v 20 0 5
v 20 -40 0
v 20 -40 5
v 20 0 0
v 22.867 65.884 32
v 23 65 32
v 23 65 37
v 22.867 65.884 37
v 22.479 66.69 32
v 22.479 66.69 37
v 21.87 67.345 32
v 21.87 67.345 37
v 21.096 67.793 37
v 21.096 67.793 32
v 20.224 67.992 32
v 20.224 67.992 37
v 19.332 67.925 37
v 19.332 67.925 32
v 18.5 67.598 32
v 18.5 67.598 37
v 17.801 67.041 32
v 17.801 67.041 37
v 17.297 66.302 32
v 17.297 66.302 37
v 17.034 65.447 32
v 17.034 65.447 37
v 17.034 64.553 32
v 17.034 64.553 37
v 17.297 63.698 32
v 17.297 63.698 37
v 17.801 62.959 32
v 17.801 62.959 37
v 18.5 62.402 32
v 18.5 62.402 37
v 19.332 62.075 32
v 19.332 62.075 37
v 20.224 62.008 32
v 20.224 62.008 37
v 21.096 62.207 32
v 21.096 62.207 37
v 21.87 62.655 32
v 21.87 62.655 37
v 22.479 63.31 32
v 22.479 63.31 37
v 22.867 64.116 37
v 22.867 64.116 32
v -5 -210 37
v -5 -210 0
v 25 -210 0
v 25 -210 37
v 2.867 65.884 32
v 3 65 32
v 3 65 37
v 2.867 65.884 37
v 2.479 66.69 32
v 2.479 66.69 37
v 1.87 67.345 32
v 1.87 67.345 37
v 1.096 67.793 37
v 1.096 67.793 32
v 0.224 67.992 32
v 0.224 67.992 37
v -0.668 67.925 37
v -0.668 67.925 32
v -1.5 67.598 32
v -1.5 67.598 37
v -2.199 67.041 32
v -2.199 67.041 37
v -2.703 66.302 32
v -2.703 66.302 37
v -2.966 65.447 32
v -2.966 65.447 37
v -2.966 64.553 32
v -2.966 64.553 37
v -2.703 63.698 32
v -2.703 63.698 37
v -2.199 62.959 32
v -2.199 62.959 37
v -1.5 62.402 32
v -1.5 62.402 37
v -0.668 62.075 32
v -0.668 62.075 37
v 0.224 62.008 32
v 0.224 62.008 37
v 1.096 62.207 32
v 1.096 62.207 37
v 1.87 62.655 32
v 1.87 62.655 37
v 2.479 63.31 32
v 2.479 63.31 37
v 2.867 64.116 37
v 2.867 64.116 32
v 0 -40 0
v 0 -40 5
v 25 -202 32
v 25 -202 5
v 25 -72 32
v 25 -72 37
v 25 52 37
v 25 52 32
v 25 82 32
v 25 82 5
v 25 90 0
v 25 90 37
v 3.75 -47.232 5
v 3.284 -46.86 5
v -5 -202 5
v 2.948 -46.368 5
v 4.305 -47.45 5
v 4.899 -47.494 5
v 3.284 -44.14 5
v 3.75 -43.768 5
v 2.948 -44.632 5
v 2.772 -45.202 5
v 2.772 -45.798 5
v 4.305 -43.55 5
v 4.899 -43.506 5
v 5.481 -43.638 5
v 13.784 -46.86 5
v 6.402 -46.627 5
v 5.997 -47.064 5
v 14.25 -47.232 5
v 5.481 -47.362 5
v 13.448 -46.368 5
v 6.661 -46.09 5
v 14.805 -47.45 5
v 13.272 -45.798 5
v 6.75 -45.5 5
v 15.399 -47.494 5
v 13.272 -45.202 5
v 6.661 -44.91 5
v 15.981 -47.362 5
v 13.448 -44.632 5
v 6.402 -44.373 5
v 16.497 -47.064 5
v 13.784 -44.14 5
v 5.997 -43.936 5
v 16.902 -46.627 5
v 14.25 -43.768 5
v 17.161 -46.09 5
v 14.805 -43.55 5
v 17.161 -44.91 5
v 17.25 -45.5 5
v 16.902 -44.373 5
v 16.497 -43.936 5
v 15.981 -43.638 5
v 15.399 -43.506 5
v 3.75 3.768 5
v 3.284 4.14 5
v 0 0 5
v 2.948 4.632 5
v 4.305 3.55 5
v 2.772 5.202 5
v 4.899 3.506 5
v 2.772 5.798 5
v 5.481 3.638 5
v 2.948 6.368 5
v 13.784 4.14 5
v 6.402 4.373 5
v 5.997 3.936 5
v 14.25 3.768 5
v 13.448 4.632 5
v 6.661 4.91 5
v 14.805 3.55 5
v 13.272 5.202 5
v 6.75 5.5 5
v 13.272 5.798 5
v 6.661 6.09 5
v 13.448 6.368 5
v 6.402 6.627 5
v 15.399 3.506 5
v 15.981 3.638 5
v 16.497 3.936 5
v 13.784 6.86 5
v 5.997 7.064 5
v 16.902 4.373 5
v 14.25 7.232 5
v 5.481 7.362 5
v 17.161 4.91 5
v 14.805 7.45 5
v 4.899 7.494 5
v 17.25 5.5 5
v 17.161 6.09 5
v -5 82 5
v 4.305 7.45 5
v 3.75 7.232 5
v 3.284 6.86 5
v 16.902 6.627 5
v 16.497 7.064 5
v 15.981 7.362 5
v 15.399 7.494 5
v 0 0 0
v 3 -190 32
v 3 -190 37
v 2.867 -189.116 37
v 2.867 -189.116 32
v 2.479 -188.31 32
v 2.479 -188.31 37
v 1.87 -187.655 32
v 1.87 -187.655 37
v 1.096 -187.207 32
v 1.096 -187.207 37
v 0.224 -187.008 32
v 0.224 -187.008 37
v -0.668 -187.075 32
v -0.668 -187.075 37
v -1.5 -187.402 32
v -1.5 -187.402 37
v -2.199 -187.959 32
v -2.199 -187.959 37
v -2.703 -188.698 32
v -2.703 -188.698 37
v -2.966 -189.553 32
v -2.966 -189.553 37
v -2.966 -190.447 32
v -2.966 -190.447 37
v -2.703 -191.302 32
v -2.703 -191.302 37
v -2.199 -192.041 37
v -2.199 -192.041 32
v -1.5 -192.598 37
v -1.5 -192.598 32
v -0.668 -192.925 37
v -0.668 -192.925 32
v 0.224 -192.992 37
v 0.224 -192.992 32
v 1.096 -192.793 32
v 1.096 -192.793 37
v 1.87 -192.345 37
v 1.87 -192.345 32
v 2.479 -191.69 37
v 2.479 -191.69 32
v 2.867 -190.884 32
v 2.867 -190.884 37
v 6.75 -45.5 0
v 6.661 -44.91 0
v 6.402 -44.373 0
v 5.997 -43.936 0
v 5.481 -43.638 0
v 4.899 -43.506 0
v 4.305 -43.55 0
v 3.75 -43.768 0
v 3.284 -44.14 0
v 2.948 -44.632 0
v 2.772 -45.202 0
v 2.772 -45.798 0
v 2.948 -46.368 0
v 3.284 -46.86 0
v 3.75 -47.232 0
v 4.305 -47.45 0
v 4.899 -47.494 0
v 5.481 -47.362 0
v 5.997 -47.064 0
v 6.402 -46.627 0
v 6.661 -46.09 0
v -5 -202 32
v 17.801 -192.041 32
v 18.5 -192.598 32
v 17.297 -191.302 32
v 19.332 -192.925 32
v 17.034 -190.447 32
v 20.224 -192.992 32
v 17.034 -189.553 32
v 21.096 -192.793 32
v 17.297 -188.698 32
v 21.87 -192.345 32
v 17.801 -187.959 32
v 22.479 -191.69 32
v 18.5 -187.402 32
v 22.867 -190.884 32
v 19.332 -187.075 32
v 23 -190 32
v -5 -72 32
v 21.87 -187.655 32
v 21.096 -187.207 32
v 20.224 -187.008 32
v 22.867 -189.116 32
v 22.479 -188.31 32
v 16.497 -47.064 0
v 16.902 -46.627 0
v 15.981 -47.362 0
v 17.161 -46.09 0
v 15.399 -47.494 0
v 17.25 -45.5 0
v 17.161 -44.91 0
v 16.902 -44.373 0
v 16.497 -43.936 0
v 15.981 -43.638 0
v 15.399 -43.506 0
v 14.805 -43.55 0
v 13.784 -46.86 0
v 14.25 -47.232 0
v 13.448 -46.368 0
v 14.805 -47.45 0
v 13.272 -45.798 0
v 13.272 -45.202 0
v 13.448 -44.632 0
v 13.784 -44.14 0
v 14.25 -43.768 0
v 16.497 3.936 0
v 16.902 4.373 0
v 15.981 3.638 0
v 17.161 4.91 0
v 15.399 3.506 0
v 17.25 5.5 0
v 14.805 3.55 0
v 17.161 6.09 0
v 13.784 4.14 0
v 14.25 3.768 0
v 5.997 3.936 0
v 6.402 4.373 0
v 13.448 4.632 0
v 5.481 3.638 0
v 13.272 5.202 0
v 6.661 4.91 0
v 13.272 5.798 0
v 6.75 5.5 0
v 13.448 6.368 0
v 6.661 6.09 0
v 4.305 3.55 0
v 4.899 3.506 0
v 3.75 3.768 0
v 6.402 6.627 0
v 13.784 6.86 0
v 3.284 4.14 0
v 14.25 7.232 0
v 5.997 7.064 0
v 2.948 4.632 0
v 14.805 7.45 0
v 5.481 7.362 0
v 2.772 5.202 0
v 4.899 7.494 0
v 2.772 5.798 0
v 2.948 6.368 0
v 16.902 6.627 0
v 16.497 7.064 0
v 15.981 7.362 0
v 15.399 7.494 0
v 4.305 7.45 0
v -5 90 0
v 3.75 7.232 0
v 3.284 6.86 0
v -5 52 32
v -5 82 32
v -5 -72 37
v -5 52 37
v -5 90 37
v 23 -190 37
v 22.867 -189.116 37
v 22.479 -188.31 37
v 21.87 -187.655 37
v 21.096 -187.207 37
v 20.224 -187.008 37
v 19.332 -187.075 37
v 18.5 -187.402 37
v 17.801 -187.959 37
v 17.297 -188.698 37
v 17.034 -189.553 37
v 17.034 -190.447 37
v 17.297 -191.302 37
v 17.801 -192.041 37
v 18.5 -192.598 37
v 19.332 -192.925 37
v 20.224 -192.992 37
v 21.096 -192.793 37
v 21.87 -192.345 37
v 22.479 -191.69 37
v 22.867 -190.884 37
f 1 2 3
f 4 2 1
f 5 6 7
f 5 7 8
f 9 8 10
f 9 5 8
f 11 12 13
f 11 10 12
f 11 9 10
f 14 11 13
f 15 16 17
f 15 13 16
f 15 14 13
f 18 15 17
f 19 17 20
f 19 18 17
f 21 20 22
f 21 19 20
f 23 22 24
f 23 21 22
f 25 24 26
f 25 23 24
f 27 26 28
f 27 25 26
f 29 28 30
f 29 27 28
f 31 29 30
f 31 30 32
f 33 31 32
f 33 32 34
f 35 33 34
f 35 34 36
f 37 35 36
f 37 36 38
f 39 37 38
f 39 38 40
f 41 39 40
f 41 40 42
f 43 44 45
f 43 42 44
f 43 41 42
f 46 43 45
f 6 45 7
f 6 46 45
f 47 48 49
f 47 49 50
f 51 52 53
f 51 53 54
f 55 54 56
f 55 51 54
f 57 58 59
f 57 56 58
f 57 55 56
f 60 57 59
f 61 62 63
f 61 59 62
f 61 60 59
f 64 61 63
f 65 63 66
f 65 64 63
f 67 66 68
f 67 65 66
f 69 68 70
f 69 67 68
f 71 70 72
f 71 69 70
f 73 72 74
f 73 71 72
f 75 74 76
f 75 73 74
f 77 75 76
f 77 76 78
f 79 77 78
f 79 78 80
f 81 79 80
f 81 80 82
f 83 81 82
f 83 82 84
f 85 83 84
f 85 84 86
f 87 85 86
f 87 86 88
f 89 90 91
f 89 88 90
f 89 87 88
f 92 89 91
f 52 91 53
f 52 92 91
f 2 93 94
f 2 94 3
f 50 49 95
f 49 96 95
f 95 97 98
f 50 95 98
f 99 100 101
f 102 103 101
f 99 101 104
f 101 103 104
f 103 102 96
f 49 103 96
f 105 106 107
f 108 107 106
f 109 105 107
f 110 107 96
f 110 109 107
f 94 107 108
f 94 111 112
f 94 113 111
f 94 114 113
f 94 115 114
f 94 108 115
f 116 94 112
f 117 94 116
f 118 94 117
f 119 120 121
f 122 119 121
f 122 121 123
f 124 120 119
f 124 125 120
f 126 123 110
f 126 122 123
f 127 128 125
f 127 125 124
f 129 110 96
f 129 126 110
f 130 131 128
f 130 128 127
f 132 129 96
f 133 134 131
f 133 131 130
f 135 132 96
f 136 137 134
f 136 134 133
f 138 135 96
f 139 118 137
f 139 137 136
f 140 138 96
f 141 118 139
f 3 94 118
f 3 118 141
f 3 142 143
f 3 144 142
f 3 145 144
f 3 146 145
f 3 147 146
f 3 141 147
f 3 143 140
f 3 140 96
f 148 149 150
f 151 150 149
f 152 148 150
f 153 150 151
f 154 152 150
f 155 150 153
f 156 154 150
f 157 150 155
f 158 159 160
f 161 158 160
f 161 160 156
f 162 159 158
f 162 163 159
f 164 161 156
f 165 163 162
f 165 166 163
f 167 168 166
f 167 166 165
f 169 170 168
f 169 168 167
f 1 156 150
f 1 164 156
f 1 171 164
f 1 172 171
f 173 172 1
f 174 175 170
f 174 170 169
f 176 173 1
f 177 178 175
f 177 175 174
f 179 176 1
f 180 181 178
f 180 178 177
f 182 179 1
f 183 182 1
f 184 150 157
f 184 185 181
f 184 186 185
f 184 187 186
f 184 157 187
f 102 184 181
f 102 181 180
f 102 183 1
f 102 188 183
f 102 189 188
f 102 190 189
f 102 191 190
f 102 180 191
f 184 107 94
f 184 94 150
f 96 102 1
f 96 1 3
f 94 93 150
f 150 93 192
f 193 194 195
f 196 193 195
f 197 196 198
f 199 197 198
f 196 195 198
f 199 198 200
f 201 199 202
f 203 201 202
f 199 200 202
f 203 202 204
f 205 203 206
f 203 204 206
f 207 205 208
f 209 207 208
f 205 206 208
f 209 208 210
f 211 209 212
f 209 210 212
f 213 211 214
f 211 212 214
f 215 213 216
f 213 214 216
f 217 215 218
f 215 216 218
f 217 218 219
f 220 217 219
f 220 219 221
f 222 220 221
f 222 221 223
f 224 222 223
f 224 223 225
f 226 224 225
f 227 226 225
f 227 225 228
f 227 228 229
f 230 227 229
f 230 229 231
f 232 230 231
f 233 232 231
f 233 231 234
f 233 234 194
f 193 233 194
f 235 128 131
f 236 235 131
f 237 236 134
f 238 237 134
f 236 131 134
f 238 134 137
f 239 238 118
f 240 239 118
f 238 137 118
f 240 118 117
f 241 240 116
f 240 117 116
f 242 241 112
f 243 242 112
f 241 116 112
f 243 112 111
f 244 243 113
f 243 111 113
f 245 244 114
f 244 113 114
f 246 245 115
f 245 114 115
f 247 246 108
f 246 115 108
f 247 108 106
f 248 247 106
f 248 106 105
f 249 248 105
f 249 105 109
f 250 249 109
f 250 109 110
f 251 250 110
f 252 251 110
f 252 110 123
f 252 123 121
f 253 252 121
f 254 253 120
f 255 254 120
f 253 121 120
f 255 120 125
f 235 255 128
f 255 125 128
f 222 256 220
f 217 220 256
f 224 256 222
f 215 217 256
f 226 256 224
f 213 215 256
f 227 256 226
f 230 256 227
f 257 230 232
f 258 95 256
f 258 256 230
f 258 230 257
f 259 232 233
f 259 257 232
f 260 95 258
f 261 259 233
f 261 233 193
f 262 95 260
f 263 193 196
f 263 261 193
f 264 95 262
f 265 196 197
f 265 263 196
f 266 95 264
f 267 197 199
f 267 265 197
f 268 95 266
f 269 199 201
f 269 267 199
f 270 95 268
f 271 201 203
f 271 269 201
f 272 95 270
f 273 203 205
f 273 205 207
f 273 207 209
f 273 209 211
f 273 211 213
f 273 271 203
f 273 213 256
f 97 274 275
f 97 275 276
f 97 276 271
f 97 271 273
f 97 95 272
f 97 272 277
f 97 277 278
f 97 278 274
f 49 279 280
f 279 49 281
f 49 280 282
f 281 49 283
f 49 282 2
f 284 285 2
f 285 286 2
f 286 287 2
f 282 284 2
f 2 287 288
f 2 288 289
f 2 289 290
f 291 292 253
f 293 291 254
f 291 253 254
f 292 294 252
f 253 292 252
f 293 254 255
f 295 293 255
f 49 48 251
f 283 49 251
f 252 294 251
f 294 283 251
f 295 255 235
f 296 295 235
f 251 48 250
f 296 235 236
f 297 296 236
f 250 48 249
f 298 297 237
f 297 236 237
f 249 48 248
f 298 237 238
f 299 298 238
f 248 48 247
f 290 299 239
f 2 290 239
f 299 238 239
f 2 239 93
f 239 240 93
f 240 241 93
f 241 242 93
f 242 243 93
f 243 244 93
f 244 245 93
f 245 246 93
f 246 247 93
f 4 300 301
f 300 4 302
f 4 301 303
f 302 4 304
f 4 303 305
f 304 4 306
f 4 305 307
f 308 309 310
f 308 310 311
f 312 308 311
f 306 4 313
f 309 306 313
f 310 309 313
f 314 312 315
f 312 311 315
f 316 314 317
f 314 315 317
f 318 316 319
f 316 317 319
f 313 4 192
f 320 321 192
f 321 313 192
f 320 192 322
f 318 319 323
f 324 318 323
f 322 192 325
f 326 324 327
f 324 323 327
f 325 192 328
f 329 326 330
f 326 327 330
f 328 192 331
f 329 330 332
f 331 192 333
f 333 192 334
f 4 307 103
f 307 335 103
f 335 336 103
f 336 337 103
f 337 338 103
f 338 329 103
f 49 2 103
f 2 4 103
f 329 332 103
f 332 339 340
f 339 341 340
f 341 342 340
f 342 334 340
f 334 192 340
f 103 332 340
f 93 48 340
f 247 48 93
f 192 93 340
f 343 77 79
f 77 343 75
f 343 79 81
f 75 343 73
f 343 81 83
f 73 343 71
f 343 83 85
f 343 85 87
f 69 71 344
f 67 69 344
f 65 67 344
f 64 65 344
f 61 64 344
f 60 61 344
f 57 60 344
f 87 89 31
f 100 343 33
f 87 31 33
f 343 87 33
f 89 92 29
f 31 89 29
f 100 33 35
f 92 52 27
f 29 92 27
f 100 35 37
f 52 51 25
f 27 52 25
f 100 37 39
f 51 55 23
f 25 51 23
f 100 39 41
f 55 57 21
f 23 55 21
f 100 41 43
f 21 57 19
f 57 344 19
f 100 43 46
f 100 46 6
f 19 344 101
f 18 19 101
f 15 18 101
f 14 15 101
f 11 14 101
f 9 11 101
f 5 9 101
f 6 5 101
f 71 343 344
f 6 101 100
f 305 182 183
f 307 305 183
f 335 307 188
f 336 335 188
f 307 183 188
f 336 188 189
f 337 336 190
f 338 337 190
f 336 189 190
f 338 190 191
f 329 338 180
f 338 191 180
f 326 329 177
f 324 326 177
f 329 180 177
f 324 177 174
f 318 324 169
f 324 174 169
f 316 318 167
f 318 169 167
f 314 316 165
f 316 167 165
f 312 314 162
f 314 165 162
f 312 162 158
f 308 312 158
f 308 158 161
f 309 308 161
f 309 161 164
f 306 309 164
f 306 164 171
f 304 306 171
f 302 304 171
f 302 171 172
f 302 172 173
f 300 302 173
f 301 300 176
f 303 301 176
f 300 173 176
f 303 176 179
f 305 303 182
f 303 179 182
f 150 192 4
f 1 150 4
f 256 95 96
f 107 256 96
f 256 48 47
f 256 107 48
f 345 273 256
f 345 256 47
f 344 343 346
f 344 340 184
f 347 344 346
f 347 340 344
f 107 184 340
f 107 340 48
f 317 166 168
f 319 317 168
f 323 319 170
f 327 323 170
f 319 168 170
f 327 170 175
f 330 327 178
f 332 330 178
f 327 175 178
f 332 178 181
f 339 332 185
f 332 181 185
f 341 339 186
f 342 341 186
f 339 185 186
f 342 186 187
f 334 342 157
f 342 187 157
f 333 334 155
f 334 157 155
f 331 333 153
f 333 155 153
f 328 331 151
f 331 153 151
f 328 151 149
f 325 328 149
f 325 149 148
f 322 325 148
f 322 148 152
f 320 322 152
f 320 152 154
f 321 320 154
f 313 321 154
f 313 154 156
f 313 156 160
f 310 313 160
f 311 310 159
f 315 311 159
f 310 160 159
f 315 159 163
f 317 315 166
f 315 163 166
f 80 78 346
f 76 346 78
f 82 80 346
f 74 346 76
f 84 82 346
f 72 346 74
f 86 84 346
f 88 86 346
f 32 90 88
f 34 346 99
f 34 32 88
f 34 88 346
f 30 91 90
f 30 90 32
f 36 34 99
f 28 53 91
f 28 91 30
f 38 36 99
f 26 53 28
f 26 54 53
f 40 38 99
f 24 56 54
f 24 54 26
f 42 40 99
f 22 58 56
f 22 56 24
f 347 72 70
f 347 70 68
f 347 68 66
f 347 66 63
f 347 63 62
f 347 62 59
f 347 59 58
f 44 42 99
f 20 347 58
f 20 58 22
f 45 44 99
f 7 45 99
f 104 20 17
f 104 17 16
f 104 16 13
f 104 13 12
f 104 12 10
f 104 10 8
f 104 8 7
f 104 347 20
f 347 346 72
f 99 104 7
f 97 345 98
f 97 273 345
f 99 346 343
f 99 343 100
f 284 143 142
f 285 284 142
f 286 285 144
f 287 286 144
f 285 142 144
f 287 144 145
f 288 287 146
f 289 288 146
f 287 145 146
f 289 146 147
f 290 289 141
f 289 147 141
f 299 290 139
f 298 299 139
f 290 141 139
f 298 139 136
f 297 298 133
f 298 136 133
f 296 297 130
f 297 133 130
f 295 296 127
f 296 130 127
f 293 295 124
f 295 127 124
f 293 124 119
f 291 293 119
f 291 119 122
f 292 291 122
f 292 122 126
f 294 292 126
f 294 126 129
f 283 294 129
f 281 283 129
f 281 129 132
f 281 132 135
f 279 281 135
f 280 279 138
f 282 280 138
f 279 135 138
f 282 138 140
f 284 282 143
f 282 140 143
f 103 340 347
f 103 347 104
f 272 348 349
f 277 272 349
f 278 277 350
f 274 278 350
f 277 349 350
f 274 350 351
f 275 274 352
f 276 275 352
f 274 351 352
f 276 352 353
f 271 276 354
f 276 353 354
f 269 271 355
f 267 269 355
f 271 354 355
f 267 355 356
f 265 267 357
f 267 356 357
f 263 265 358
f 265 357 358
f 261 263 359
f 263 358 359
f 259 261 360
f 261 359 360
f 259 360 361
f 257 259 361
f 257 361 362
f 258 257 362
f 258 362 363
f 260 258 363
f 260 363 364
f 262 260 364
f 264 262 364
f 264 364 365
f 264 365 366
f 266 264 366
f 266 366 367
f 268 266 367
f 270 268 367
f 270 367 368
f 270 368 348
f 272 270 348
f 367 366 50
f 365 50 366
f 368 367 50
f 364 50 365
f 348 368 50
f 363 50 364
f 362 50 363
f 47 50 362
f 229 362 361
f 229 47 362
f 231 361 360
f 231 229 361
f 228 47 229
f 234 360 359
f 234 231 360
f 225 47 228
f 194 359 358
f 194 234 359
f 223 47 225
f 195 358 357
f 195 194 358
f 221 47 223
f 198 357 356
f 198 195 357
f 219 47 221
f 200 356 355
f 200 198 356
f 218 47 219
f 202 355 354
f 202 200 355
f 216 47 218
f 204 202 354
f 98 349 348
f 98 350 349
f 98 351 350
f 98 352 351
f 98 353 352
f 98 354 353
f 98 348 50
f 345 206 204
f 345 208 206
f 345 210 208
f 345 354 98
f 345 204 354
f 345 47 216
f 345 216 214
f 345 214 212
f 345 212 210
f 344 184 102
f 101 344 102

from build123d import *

# Parameters (mm, degrees)
SKETCH_2_W          = 30
SKETCH_2_H          = 60
SKETCH_2_W_2        = 20
SKETCH_2_H_2        = 40
EXTRUDE_1_DEPTH     = 5
SKETCH_3_R          = 2
CUT_EXTRUDE_1_DEPTH = 5
EXTRUDE_2_DEPTH     = 5
SKETCH_6_R          = 1.5
CUT_EXTRUDE_2_DEPTH = 5
SKETCH_7_W          = 5
SKETCH_7_H          = 10
CUT_EXTRUDE_3_DEPTH = 100
SKETCH_8_W          = 30
SKETCH_8_H          = 5
EXTRUDE_3_DEPTH     = 80
SKETCH_9_W          = 30
SKETCH_9_H          = 5
EXTRUDE_4_DEPTH     = 60
SKETCH_11_W         = 30
SKETCH_11_H         = 8
EXTRUDE_5_DEPTH     = 32
EXTRUDE_6_DEPTH     = 30
SKETCH_14_W         = 30
SKETCH_14_H         = 5
EXTRUDE_7_DEPTH     = 30
SKETCH_15_W         = 37
SKETCH_15_H         = 100
EXTRUDE_8_DEPTH     = 30
SKETCH_12_R         = 3
CUT_EXTRUDE_5_DEPTH = 50
SKETCH_16_W         = 27
SKETCH_16_H         = 100
CUT_EXTRUDE_6_DEPTH = 30
SKETCH_17_R         = 3
CUT_EXTRUDE_7_DEPTH = 30


with BuildPart() as part:
    # 草图2 → 凸台-拉伸1 (new body)
    with BuildSketch(Plane.XY):
        with Locations((10, -20)):
            Rectangle(SKETCH_2_W, SKETCH_2_H)
        with Locations((10, -20)):
            Rectangle(SKETCH_2_W_2, SKETCH_2_H_2, mode=Mode.SUBTRACT)
    extrude(amount=EXTRUDE_1_DEPTH)

    # 草图3 → 切除-拉伸1 (cut)
    with BuildSketch(Plane.XY.offset(5)):
        with Locations((15.25, 5.5)):
            Circle(SKETCH_3_R)
        with Locations((15.25, -45.5)):
            Circle(SKETCH_3_R)
        with Locations((4.75, -45.5)):
            Circle(SKETCH_3_R)
        with Locations((4.75, 5.5)):
            Circle(SKETCH_3_R)
    extrude(amount=-CUT_EXTRUDE_1_DEPTH, mode=Mode.SUBTRACT)

    # 草图5 → 凸台-拉伸2 (add)
    with BuildSketch(Plane(origin=(25, 0, 0), x_dir=(0, 0, -1), z_dir=(1, 0, 0))):
        with BuildLine():
            Line((-5, -42), (-5, -40))
            Line((-5, -40), (0, -40))
            Line((0, -40), (0, -42))
            ThreePointArc((0, -42), (0.878679656, -44.121320344), (3, -45))
            Line((3, -45), (20, -45))
            Line((20, -45), (20, -50))
            Line((20, -50), (0, -50))
            Line((0, -50), (-5, -50))
            Line((-5, -50), (-25, -50))
            Line((-25, -50), (-25, -45))
            Line((-25, -45), (-8, -45))
            ThreePointArc((-8, -45), (-5.878679656, -44.121320344), (-5, -42))
        make_face()
    extrude_2 = extrude(amount=EXTRUDE_2_DEPTH)

    # 镜向1: 凸台-拉伸2 across plane
    add(extrude_2.mirror(Plane(origin=(10, 0, 0), x_dir=(0, 0, 1), z_dir=(1, 0, 0))))

    # 草图6 → 切除-拉伸2 (cut)
    with BuildSketch(Plane(origin=(0, -45, 0), x_dir=(1, 0, 0), z_dir=(0, 1, 0))):
        with Locations(Location((-7.5, 12.5, 0), (0, 0, 270))):
            Circle(SKETCH_6_R)
        with Locations(Location((-7.5, -17.5, 0), (0, 0, 270))):
            Circle(SKETCH_6_R)
        with Locations(Location((27.5, -17.5, 0), (0, 0, 270))):
            Circle(SKETCH_6_R)
        with Locations(Location((27.5, 12.5, 0), (0, 0, 270))):
            Circle(SKETCH_6_R)
    extrude(amount=-CUT_EXTRUDE_2_DEPTH, mode=Mode.SUBTRACT)

    # 草图7 → 切除-拉伸3 (cut)
    with BuildSketch(Plane.XY.offset(25)):
        with Locations((27.5, -45)):
            Rectangle(SKETCH_7_W, SKETCH_7_H)
        with Locations((-7.5, -45)):
            Rectangle(SKETCH_7_W, SKETCH_7_H)
    extrude(amount=-CUT_EXTRUDE_3_DEPTH, mode=Mode.SUBTRACT)

    # 草图8 → 凸台-拉伸3 (add)
    with BuildSketch(Plane(origin=(0, 10, 0), x_dir=(1, 0, 0), z_dir=(0, 1, 0))):
        with Locations((10, -2.5)):
            Rectangle(SKETCH_8_W, SKETCH_8_H)
    extrude(amount=EXTRUDE_3_DEPTH)

    # 草图9 → 凸台-拉伸4 (add)
    with BuildSketch(Plane.XZ.offset(50)):
        with Locations((10, 2.5)):
            Rectangle(SKETCH_9_W, SKETCH_9_H)
    extrude(amount=EXTRUDE_4_DEPTH)

    # 草图11 → 凸台-拉伸5 (add)
    with BuildSketch(Plane.XY.offset(5)):
        with Locations((10, -106)):
            Rectangle(SKETCH_11_W, SKETCH_11_H)
        with Locations((10, 86)):
            Rectangle(SKETCH_11_W, SKETCH_11_H)
    extrude(amount=EXTRUDE_5_DEPTH)

    # 草图13 → 凸台-拉伸6 (add)
    with BuildSketch(Plane(origin=(0, -102, 0), x_dir=(1, 0, 0), z_dir=(0, 1, 0))):
        Polygon((-5, -37), (25, -37), (25, -34.408335309), (25, -32), (-5, -32), align=None)
    extrude(amount=EXTRUDE_6_DEPTH)

    # 草图14 → 凸台-拉伸7 (add)
    with BuildSketch(Plane.XZ.offset(-82)):
        with Locations((10, 34.5)):
            Rectangle(SKETCH_14_W, SKETCH_14_H)
    extrude(amount=EXTRUDE_7_DEPTH)

    # 草图15 → 凸台-拉伸8 (add)
    with BuildSketch(Plane.ZY.offset(5)):
        with Locations((18.5, -160)):
            Rectangle(SKETCH_15_W, SKETCH_15_H)
    extrude(amount=-EXTRUDE_8_DEPTH)

    # 草图12 → 切除-拉伸5 (cut)
    with BuildSketch(Plane.XY.offset(5)):
        with Locations((0, 65)):
            Circle(SKETCH_12_R)
        with Locations((20, 65)):
            Circle(SKETCH_12_R)
    extrude(amount=CUT_EXTRUDE_5_DEPTH, mode=Mode.SUBTRACT)

    # 草图16 → 切除-拉伸6 (cut)
    with BuildSketch(Plane(origin=(25, 0, 0), x_dir=(0, 0, -1), z_dir=(1, 0, 0))):
        with Locations((-18.5, -152)):
            Rectangle(SKETCH_16_W, SKETCH_16_H)
    extrude(amount=-CUT_EXTRUDE_6_DEPTH, mode=Mode.SUBTRACT)

    # 草图17 → 切除-拉伸7 (cut)
    with BuildSketch(Plane.XY.offset(37)):
        with Locations((20, -190)):
            Circle(SKETCH_17_R)
        with Locations((0, -190)):
            Circle(SKETCH_17_R)
    extrude(amount=-CUT_EXTRUDE_7_DEPTH, mode=Mode.SUBTRACT)


solid = part.part
